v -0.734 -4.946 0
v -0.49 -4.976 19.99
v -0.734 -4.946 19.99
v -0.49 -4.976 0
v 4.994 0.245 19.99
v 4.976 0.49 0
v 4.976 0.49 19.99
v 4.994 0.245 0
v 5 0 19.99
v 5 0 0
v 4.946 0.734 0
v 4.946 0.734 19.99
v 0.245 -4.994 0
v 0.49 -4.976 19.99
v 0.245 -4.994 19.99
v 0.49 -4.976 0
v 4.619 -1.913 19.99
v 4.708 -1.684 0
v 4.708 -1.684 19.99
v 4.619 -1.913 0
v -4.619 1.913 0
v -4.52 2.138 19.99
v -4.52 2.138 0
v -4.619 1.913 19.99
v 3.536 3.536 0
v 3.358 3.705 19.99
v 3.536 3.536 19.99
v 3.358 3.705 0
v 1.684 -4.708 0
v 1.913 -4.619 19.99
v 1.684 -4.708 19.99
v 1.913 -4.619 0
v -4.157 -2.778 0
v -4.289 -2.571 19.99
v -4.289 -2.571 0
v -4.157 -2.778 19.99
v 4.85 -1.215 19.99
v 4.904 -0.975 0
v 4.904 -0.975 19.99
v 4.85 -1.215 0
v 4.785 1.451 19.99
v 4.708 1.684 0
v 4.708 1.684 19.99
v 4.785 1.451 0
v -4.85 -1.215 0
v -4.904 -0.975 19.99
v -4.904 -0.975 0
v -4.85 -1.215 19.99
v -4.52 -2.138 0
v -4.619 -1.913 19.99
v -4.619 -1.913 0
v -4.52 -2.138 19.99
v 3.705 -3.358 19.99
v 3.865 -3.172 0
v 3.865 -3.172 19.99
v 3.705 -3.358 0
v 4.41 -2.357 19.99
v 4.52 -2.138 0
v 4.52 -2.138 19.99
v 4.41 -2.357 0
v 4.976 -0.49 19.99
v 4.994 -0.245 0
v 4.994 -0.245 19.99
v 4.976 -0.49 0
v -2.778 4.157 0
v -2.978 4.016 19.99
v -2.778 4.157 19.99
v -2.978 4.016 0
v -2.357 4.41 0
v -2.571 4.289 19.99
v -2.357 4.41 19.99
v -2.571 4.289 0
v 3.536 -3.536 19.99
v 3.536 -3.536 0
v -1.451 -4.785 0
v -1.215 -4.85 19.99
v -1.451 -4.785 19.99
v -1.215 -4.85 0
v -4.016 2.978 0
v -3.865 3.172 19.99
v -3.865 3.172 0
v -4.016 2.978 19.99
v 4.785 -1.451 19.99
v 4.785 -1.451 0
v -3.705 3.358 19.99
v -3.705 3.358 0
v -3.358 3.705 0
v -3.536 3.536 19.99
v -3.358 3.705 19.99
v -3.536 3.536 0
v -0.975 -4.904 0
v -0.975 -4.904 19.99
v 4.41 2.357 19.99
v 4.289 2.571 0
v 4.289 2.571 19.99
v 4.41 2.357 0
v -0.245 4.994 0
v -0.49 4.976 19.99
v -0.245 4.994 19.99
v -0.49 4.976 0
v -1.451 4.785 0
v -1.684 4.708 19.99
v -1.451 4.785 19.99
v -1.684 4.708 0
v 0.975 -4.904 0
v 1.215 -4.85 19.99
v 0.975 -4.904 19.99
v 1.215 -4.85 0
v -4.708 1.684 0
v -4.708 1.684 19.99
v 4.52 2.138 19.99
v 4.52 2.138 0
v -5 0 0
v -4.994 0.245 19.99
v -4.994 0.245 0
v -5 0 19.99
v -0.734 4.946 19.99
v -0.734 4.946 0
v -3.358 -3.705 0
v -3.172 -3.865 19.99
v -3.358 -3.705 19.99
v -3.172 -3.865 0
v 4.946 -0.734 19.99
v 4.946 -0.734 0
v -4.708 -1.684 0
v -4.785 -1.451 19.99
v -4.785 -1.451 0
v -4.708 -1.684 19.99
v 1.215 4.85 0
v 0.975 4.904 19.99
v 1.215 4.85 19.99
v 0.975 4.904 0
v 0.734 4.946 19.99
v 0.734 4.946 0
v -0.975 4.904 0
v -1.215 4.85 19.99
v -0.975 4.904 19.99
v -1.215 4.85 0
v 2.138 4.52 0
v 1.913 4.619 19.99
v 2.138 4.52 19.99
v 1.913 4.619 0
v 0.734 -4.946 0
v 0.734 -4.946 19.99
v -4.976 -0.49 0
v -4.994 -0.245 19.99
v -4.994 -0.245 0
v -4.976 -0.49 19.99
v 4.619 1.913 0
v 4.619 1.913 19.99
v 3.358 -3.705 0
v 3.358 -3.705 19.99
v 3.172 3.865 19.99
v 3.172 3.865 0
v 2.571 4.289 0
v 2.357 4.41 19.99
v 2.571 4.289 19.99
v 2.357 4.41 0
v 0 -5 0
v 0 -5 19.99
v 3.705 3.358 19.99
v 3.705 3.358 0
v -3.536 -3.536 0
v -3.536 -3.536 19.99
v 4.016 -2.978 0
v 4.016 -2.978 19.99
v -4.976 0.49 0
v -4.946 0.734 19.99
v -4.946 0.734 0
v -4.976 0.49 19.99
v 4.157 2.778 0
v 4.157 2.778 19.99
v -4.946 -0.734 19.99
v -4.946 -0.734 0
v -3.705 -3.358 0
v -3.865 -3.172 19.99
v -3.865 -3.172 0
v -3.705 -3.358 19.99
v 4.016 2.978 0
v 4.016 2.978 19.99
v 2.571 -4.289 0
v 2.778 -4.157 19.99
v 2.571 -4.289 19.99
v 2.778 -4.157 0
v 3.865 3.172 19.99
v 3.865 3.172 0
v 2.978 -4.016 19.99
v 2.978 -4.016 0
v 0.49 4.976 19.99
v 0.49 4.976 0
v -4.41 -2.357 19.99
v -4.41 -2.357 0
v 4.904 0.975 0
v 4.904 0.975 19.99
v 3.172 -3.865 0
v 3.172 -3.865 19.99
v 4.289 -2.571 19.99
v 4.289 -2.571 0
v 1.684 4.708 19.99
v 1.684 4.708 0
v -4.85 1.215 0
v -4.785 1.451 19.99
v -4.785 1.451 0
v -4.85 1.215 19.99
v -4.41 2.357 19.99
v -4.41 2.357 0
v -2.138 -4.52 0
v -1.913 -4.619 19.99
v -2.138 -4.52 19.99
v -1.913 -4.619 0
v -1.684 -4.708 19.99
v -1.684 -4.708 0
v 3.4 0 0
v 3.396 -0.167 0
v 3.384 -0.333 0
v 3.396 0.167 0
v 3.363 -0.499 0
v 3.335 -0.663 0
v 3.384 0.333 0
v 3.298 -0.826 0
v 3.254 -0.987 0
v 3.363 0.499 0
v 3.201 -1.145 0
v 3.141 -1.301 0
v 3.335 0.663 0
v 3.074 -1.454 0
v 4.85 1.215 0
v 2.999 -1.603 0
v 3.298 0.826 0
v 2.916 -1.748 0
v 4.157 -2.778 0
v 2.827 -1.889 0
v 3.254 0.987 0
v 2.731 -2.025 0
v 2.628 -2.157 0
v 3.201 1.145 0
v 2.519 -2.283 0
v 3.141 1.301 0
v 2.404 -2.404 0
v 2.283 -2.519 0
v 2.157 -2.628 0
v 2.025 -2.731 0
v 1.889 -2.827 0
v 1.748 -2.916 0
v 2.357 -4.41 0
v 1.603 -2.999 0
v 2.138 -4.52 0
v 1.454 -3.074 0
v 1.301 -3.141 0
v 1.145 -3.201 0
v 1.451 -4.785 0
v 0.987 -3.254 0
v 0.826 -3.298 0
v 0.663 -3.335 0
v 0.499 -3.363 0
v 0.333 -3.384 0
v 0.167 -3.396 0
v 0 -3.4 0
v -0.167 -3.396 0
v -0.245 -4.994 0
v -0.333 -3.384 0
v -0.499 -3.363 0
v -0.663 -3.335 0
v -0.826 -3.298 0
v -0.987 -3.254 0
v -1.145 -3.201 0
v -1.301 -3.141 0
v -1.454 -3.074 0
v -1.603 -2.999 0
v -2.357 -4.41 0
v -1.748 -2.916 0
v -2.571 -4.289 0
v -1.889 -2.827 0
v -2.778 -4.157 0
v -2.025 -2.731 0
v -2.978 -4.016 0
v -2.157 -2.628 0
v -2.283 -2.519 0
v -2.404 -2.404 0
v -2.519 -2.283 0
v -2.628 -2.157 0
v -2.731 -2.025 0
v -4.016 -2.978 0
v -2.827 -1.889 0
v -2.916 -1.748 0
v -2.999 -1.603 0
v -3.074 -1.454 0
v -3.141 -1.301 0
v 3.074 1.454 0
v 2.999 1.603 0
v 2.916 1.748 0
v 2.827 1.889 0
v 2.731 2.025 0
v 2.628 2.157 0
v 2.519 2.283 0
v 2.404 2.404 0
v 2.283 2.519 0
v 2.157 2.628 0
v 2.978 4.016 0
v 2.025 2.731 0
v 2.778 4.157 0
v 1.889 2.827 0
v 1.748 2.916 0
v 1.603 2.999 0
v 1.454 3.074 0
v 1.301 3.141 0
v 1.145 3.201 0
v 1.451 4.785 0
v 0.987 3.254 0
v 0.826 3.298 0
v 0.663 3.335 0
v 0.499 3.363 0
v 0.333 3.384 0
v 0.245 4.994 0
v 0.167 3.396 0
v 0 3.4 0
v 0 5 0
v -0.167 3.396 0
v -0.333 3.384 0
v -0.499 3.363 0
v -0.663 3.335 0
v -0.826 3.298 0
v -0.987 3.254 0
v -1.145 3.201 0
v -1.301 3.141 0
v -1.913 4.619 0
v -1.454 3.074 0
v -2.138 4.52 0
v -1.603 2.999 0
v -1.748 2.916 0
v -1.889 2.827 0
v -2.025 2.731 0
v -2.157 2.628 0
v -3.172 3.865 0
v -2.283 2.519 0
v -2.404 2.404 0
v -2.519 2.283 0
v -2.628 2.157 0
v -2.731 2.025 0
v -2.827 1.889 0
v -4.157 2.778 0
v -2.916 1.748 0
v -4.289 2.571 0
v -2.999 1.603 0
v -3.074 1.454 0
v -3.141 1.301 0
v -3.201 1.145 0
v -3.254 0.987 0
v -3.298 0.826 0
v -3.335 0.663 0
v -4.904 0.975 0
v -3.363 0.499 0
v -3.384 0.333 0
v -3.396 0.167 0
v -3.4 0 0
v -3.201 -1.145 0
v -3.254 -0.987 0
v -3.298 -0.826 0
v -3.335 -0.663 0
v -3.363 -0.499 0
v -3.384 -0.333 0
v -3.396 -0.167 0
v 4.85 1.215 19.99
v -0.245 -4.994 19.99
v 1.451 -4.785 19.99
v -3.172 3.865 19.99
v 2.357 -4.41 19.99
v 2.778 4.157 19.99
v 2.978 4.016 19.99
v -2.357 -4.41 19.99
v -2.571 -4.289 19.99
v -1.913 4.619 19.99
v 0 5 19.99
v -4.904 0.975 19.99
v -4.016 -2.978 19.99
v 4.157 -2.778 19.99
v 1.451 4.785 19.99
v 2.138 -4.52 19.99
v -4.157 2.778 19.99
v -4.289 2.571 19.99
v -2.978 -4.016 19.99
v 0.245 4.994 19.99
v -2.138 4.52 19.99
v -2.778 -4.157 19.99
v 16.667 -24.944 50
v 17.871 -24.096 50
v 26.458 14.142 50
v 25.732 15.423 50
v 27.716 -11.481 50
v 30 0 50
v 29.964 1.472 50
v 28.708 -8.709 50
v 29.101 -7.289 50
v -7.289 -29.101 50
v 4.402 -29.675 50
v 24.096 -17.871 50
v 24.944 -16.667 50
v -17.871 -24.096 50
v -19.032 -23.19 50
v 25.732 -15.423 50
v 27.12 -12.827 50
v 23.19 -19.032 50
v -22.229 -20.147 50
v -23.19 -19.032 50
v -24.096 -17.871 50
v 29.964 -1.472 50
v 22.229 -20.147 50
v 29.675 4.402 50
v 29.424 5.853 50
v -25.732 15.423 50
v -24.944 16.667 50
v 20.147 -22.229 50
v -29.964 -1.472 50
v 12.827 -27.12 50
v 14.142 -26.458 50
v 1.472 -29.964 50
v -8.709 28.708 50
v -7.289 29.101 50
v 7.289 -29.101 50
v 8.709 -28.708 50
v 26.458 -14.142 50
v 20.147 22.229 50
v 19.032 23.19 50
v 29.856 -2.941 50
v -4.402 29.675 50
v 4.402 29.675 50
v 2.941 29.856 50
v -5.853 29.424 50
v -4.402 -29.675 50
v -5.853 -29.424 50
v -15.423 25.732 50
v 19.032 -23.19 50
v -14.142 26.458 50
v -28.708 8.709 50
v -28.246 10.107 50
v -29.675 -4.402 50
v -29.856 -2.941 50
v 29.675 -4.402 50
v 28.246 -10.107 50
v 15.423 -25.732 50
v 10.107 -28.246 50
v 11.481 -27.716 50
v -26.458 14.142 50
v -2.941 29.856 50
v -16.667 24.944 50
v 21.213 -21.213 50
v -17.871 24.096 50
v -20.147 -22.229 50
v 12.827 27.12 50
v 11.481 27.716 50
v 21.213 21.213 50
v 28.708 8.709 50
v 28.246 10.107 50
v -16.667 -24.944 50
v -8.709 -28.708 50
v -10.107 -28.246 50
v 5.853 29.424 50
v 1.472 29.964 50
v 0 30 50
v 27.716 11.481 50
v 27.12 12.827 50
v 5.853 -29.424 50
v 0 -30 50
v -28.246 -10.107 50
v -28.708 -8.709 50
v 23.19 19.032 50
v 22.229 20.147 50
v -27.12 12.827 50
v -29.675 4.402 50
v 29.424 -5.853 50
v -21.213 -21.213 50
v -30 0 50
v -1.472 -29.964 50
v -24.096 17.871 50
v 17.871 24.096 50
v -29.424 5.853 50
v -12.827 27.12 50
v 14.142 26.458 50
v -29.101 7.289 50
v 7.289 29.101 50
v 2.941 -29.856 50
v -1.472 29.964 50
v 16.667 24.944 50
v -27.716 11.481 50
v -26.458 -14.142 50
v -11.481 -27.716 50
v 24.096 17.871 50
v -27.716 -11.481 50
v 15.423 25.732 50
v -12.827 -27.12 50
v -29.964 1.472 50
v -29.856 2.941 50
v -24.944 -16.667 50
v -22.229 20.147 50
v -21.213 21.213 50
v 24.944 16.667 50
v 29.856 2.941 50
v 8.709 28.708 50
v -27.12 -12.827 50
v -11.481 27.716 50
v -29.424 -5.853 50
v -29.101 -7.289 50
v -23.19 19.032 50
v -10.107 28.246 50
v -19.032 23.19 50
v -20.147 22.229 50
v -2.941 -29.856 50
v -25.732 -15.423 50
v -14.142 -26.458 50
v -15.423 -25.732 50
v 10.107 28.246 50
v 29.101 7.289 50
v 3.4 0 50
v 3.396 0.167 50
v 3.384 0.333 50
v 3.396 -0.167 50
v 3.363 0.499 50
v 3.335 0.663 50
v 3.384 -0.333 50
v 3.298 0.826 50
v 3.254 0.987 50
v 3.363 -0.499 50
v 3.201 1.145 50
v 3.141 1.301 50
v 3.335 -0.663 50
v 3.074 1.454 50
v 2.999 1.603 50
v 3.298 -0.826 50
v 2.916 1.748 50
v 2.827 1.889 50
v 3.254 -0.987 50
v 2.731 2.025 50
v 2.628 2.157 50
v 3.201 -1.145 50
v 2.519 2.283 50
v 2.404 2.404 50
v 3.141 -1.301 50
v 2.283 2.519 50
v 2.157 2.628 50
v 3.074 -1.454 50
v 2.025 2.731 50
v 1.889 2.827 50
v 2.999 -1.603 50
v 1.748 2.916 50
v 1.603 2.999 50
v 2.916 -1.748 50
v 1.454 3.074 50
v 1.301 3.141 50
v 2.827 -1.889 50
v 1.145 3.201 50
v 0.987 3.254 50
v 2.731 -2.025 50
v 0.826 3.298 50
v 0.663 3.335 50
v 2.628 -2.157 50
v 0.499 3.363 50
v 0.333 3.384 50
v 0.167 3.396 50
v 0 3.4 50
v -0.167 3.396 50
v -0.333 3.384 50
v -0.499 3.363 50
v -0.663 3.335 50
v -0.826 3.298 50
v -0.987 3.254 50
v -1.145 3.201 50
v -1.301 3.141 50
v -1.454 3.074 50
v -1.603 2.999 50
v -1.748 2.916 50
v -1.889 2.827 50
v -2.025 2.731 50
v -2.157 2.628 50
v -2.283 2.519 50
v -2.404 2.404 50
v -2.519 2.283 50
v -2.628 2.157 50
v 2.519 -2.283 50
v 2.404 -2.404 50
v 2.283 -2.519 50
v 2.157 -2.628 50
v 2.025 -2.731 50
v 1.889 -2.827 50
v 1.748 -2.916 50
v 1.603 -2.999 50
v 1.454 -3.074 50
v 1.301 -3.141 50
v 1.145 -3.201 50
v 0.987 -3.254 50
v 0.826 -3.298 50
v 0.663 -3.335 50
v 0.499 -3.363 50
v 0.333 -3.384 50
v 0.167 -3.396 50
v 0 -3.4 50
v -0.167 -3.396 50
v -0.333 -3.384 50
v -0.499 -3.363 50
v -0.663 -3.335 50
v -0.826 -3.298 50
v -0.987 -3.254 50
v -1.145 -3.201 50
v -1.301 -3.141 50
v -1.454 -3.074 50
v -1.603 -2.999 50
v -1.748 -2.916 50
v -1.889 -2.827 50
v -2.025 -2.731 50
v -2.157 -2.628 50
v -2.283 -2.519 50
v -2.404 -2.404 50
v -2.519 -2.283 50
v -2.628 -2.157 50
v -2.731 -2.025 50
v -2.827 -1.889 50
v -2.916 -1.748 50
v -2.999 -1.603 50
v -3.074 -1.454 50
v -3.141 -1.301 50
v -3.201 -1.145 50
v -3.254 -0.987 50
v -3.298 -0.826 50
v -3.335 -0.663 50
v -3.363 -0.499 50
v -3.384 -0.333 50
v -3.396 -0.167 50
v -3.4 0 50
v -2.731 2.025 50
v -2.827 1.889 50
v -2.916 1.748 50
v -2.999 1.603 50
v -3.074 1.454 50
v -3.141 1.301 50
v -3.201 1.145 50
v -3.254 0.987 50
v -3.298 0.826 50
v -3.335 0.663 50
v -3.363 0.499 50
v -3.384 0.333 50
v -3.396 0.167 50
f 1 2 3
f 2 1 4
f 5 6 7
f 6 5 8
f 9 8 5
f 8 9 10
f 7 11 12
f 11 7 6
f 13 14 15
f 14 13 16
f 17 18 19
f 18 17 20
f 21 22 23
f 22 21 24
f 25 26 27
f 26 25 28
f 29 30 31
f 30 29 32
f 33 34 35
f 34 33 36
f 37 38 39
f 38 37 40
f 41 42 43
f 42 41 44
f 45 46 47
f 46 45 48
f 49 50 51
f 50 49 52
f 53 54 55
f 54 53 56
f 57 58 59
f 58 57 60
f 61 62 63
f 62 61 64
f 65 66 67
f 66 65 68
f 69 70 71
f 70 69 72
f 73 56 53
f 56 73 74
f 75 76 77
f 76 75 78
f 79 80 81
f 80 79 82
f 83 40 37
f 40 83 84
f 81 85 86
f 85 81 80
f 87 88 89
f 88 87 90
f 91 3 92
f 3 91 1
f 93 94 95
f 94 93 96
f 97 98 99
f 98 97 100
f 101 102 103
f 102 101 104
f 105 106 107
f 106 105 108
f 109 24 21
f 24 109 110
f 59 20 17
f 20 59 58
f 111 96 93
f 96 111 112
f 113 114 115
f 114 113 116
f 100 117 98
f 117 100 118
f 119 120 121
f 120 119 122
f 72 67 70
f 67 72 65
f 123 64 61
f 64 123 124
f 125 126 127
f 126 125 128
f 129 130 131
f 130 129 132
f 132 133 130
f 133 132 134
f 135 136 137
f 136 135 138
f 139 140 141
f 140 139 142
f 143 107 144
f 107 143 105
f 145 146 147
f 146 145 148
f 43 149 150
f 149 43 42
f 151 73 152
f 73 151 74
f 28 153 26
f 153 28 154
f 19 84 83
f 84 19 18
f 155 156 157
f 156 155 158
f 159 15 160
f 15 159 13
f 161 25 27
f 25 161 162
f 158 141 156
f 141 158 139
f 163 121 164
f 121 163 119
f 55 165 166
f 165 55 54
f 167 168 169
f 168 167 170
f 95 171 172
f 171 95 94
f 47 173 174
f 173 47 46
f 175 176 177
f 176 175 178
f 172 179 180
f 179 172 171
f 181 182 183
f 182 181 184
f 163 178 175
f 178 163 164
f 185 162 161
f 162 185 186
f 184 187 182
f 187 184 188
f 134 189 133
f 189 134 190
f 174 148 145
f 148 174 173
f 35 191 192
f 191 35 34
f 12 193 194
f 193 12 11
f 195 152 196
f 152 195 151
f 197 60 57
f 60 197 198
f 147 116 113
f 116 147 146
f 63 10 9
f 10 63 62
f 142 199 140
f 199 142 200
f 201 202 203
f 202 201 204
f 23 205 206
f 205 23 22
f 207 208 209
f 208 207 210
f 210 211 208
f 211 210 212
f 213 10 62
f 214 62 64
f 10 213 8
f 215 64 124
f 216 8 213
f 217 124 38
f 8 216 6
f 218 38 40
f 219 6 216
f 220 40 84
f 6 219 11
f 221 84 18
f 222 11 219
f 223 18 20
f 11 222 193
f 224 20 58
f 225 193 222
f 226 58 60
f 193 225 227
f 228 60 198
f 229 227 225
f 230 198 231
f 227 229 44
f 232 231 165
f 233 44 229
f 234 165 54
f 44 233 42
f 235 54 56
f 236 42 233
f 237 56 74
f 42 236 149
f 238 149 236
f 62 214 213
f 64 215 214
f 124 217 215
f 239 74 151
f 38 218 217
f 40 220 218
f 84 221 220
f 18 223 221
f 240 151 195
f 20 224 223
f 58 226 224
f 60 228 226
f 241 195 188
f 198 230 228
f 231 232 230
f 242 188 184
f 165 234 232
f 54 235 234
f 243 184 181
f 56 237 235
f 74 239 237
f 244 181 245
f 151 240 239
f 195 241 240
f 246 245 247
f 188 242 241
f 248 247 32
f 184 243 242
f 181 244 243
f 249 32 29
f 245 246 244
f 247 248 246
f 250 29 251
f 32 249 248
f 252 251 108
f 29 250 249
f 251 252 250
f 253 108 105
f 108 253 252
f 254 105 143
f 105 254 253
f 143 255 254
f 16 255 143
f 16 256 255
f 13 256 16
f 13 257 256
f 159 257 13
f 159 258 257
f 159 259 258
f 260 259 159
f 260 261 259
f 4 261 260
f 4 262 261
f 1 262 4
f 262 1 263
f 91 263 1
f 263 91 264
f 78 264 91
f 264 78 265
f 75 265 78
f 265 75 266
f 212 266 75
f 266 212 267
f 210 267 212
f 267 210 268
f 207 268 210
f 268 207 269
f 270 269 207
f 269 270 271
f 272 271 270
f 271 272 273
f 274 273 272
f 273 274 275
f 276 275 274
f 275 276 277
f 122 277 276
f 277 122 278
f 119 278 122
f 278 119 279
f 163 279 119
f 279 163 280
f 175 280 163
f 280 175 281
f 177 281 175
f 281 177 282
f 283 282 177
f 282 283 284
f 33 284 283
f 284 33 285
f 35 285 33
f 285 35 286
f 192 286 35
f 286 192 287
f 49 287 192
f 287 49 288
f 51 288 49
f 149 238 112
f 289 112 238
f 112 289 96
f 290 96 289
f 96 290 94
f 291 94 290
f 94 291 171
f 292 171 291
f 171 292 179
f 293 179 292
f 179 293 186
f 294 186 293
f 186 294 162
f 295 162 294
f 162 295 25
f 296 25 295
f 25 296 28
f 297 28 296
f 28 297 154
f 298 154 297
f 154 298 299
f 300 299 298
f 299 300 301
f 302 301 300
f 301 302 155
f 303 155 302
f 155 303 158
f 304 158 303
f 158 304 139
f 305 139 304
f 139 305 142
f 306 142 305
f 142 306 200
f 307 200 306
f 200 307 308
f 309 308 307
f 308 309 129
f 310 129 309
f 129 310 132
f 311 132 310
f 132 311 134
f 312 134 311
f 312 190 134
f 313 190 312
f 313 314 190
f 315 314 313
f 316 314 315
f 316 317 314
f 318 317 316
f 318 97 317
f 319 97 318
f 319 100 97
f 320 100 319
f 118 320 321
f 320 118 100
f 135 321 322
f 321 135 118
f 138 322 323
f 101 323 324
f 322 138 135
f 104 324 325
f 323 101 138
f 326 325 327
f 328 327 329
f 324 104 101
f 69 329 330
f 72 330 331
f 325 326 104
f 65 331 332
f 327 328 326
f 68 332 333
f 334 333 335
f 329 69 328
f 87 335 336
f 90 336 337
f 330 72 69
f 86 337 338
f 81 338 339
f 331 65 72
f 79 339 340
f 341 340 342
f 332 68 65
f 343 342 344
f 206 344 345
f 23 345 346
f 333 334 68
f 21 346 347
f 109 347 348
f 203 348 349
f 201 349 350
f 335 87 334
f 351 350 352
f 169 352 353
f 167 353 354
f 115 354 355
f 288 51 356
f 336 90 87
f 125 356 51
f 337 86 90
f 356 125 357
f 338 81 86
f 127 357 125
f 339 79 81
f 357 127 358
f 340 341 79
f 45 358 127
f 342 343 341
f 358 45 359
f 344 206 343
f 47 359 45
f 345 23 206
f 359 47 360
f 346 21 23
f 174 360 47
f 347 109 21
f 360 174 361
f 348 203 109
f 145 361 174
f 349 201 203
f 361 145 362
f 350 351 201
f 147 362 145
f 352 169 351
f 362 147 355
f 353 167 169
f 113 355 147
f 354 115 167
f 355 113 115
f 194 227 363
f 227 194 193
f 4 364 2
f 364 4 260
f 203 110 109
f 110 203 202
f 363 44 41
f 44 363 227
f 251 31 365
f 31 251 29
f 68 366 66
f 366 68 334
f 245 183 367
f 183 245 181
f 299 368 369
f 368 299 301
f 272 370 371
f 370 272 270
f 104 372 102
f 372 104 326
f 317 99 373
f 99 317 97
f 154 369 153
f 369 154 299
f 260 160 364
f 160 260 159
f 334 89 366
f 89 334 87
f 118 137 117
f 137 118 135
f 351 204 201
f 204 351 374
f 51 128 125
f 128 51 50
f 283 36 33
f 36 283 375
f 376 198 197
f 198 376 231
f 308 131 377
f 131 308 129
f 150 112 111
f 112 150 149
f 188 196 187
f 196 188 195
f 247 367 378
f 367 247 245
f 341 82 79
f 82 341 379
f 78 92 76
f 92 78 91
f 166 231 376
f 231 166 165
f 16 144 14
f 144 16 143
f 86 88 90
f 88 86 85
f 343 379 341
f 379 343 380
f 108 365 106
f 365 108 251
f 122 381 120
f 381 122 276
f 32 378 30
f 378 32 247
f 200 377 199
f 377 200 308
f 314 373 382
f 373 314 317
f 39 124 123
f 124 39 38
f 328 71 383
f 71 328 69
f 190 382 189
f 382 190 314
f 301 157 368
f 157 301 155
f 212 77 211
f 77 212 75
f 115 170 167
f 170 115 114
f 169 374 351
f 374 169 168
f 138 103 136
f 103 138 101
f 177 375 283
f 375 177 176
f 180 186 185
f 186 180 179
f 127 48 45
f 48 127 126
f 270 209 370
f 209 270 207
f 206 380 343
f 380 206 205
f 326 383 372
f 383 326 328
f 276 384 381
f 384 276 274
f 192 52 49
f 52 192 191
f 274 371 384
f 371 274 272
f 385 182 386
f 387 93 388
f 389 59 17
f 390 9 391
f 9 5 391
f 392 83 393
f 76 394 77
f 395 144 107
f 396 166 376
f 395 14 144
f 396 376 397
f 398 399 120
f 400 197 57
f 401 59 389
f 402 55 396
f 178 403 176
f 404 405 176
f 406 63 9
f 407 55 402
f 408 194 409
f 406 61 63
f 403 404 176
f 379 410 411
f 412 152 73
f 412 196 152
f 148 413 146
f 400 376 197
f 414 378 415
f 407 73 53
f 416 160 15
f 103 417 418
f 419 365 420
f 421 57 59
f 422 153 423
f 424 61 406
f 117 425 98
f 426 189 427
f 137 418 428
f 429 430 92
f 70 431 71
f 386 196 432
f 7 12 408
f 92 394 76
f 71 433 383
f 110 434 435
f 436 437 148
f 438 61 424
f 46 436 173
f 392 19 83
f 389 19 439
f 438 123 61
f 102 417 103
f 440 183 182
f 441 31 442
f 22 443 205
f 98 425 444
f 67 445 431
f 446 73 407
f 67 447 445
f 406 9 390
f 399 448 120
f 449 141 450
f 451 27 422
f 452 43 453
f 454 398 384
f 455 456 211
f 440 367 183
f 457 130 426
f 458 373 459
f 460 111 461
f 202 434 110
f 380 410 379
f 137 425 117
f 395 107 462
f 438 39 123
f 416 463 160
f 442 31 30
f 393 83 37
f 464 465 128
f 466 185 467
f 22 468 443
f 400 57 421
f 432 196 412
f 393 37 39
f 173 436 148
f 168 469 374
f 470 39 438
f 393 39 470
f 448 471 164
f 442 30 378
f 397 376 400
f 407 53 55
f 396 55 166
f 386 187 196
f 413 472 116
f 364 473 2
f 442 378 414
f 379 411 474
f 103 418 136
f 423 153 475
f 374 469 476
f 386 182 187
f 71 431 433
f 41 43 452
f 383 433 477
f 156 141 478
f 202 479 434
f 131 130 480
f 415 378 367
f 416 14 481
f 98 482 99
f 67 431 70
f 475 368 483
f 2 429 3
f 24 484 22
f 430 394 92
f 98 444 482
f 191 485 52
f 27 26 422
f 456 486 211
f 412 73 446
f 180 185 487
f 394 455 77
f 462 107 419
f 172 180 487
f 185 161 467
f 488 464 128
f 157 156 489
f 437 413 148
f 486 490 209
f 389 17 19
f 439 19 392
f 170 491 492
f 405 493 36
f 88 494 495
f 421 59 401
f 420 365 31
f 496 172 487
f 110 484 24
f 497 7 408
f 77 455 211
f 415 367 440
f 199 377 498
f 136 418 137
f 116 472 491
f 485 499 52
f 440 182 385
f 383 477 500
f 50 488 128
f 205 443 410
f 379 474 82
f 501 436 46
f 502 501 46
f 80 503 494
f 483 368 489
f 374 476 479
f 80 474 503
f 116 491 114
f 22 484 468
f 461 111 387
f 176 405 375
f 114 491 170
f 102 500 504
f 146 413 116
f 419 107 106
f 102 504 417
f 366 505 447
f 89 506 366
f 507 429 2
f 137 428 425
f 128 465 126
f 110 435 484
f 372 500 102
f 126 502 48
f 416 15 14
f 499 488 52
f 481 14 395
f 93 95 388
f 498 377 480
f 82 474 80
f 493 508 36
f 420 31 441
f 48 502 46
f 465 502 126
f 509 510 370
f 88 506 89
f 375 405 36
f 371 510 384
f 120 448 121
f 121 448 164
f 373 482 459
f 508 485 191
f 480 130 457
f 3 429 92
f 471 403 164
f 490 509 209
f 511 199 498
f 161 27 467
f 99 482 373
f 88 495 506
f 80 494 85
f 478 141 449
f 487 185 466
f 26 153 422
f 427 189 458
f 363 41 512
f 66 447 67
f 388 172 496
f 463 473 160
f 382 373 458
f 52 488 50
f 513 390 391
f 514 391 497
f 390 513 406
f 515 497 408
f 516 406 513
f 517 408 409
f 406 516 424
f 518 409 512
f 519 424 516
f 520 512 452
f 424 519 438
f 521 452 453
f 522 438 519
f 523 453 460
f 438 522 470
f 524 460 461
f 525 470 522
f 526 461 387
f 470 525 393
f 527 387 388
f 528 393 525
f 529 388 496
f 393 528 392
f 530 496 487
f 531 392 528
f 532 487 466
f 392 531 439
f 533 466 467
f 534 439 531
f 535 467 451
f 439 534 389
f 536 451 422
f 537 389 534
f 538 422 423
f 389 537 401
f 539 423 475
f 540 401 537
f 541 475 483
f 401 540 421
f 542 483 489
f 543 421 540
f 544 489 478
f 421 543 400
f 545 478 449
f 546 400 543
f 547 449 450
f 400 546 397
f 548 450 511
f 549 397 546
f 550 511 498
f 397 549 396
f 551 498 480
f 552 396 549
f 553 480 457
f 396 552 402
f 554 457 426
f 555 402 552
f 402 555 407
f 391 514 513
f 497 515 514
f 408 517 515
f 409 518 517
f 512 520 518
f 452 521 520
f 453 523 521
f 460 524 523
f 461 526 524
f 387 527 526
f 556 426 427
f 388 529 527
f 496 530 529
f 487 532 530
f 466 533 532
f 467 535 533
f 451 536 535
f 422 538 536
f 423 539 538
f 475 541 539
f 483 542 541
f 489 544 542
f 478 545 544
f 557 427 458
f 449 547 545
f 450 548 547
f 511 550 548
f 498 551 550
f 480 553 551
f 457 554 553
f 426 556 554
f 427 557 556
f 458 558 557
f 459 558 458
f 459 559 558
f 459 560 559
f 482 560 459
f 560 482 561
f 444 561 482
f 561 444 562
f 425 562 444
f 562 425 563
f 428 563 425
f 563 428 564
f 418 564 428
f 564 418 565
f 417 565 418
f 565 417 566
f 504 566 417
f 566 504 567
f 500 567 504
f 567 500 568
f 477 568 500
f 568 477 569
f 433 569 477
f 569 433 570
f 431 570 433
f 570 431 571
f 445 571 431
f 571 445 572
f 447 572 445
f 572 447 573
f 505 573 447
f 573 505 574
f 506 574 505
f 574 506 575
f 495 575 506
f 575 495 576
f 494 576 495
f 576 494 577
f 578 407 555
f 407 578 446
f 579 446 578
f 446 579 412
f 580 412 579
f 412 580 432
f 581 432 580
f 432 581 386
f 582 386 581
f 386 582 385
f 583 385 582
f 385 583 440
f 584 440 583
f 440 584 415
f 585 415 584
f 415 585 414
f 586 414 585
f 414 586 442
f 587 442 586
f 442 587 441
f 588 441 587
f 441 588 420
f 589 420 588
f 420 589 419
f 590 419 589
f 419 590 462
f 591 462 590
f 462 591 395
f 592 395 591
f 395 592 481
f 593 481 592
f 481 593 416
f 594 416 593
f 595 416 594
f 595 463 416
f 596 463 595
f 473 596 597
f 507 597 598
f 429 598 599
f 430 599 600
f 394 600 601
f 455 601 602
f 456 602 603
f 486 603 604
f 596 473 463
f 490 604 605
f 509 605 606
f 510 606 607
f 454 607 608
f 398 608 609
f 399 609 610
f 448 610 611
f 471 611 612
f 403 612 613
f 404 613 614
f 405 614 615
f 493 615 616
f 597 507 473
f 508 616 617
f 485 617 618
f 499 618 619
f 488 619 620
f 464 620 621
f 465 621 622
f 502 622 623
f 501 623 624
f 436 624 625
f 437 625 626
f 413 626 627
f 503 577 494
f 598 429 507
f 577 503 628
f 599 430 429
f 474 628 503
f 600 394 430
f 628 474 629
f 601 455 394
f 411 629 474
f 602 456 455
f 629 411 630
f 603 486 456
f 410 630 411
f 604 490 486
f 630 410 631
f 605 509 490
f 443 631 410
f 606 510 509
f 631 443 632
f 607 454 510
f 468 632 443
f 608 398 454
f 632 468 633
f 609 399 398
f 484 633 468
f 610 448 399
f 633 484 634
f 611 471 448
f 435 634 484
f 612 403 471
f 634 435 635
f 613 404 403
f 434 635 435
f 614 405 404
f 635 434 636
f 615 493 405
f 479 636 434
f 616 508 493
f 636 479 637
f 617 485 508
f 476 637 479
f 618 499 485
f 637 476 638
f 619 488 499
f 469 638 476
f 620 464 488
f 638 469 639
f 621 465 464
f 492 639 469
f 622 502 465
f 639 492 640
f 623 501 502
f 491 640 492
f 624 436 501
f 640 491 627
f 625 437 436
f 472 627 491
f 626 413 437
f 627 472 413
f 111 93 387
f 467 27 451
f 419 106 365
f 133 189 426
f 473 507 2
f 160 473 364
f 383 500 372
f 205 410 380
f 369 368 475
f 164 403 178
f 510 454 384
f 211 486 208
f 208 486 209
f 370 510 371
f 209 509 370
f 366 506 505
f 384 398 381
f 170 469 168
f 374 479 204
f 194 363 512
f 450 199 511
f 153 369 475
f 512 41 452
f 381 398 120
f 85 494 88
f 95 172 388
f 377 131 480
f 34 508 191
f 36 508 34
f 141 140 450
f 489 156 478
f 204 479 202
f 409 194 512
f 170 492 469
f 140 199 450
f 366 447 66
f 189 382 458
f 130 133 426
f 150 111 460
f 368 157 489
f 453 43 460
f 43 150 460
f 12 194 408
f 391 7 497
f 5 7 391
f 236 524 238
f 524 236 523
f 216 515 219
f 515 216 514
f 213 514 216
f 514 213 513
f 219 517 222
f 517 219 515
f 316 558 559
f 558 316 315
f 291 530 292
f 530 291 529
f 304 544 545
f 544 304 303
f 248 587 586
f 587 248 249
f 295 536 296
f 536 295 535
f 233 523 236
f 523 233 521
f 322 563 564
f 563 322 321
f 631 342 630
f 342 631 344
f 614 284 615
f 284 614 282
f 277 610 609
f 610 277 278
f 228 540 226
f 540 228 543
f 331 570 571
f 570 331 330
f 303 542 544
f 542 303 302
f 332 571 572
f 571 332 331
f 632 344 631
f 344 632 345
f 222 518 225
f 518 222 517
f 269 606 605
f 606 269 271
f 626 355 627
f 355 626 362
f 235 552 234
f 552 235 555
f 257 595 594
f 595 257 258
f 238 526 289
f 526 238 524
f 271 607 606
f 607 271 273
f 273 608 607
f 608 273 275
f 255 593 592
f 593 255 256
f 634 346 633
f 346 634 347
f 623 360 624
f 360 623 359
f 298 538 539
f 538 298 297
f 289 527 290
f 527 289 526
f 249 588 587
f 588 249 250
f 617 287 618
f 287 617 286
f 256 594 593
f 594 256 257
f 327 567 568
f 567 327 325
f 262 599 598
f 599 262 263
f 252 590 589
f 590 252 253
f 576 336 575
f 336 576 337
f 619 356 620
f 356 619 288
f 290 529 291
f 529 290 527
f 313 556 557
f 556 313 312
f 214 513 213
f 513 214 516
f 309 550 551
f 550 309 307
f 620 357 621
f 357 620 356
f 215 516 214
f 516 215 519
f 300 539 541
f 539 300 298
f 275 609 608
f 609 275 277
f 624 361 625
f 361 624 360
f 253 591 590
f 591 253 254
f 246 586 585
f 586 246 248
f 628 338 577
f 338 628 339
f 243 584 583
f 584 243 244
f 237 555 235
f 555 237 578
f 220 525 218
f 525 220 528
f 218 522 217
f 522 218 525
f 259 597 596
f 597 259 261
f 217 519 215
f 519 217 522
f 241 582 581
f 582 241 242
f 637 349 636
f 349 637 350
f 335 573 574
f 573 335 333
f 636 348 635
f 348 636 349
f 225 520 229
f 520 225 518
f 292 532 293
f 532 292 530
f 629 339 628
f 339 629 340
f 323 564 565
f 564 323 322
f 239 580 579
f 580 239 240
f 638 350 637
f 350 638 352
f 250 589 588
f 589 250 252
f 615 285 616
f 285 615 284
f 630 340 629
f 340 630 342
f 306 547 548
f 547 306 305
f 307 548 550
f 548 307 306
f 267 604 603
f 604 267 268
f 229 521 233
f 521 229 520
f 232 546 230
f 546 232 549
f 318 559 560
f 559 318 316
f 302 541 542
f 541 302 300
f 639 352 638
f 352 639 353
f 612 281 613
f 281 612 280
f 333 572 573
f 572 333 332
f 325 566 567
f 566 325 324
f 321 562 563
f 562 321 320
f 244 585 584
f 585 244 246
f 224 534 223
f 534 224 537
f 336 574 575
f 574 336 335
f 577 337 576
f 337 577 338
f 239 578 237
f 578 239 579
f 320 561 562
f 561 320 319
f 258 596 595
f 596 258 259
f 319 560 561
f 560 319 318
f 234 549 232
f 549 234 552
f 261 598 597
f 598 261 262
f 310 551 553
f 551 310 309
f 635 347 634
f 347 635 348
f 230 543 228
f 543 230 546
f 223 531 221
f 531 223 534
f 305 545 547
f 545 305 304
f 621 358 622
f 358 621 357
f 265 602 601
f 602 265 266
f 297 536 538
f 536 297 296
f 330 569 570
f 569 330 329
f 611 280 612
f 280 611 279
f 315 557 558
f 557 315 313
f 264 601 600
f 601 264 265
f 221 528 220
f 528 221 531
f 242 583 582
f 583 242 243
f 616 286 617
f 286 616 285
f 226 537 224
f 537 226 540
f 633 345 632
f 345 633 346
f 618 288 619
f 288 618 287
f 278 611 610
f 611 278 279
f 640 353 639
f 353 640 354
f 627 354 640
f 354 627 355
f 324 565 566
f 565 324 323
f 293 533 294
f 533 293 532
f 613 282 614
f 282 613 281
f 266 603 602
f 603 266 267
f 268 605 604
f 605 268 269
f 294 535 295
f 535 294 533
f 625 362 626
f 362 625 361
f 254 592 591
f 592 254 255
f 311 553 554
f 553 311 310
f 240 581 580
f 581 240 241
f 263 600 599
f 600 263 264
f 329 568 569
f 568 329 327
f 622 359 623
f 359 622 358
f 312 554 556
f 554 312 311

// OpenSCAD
// Small lab funnel, printed upright (wide opening at the top)
// All dimensions in millimetres

// ---- Parameters ----
spout_od      = 10;    // spout outer diameter
spout_h       = 20;    // spout height (z = 0 to 20)
cone_od_top   = 60;    // cone outer diameter at rim
cone_h        = 30;    // cone height (z = 20 to 50)
wall          = 1.6;   // wall thickness everywhere
eps           = 0.5;   // overshoot for clean boolean cuts

$fn = 128;

// ---- Derived ----
bore = spout_od - 2 * wall;   // spout bore = 6.8 mm
rim_z = spout_h + cone_h;     // top of funnel = z = 50

// ---- Model ----
difference() {
    union() {
        // Spout tube
        cylinder(d = spout_od, h = spout_h);

        // Cone (slightly extended above the rim so it fuses)
        translate([0, 0, spout_h - 0.01])
            cylinder(d1 = spout_od, d2 = cone_od_top, h = cone_h + 0.01);
    }

    // Through-bore: starts below z = 0, runs through the spout and
    // up into the cone, so liquid flows straight through.
    translate([0, 0, -eps])
        cylinder(d = bore, h = rim_z + 2 * eps);
}
